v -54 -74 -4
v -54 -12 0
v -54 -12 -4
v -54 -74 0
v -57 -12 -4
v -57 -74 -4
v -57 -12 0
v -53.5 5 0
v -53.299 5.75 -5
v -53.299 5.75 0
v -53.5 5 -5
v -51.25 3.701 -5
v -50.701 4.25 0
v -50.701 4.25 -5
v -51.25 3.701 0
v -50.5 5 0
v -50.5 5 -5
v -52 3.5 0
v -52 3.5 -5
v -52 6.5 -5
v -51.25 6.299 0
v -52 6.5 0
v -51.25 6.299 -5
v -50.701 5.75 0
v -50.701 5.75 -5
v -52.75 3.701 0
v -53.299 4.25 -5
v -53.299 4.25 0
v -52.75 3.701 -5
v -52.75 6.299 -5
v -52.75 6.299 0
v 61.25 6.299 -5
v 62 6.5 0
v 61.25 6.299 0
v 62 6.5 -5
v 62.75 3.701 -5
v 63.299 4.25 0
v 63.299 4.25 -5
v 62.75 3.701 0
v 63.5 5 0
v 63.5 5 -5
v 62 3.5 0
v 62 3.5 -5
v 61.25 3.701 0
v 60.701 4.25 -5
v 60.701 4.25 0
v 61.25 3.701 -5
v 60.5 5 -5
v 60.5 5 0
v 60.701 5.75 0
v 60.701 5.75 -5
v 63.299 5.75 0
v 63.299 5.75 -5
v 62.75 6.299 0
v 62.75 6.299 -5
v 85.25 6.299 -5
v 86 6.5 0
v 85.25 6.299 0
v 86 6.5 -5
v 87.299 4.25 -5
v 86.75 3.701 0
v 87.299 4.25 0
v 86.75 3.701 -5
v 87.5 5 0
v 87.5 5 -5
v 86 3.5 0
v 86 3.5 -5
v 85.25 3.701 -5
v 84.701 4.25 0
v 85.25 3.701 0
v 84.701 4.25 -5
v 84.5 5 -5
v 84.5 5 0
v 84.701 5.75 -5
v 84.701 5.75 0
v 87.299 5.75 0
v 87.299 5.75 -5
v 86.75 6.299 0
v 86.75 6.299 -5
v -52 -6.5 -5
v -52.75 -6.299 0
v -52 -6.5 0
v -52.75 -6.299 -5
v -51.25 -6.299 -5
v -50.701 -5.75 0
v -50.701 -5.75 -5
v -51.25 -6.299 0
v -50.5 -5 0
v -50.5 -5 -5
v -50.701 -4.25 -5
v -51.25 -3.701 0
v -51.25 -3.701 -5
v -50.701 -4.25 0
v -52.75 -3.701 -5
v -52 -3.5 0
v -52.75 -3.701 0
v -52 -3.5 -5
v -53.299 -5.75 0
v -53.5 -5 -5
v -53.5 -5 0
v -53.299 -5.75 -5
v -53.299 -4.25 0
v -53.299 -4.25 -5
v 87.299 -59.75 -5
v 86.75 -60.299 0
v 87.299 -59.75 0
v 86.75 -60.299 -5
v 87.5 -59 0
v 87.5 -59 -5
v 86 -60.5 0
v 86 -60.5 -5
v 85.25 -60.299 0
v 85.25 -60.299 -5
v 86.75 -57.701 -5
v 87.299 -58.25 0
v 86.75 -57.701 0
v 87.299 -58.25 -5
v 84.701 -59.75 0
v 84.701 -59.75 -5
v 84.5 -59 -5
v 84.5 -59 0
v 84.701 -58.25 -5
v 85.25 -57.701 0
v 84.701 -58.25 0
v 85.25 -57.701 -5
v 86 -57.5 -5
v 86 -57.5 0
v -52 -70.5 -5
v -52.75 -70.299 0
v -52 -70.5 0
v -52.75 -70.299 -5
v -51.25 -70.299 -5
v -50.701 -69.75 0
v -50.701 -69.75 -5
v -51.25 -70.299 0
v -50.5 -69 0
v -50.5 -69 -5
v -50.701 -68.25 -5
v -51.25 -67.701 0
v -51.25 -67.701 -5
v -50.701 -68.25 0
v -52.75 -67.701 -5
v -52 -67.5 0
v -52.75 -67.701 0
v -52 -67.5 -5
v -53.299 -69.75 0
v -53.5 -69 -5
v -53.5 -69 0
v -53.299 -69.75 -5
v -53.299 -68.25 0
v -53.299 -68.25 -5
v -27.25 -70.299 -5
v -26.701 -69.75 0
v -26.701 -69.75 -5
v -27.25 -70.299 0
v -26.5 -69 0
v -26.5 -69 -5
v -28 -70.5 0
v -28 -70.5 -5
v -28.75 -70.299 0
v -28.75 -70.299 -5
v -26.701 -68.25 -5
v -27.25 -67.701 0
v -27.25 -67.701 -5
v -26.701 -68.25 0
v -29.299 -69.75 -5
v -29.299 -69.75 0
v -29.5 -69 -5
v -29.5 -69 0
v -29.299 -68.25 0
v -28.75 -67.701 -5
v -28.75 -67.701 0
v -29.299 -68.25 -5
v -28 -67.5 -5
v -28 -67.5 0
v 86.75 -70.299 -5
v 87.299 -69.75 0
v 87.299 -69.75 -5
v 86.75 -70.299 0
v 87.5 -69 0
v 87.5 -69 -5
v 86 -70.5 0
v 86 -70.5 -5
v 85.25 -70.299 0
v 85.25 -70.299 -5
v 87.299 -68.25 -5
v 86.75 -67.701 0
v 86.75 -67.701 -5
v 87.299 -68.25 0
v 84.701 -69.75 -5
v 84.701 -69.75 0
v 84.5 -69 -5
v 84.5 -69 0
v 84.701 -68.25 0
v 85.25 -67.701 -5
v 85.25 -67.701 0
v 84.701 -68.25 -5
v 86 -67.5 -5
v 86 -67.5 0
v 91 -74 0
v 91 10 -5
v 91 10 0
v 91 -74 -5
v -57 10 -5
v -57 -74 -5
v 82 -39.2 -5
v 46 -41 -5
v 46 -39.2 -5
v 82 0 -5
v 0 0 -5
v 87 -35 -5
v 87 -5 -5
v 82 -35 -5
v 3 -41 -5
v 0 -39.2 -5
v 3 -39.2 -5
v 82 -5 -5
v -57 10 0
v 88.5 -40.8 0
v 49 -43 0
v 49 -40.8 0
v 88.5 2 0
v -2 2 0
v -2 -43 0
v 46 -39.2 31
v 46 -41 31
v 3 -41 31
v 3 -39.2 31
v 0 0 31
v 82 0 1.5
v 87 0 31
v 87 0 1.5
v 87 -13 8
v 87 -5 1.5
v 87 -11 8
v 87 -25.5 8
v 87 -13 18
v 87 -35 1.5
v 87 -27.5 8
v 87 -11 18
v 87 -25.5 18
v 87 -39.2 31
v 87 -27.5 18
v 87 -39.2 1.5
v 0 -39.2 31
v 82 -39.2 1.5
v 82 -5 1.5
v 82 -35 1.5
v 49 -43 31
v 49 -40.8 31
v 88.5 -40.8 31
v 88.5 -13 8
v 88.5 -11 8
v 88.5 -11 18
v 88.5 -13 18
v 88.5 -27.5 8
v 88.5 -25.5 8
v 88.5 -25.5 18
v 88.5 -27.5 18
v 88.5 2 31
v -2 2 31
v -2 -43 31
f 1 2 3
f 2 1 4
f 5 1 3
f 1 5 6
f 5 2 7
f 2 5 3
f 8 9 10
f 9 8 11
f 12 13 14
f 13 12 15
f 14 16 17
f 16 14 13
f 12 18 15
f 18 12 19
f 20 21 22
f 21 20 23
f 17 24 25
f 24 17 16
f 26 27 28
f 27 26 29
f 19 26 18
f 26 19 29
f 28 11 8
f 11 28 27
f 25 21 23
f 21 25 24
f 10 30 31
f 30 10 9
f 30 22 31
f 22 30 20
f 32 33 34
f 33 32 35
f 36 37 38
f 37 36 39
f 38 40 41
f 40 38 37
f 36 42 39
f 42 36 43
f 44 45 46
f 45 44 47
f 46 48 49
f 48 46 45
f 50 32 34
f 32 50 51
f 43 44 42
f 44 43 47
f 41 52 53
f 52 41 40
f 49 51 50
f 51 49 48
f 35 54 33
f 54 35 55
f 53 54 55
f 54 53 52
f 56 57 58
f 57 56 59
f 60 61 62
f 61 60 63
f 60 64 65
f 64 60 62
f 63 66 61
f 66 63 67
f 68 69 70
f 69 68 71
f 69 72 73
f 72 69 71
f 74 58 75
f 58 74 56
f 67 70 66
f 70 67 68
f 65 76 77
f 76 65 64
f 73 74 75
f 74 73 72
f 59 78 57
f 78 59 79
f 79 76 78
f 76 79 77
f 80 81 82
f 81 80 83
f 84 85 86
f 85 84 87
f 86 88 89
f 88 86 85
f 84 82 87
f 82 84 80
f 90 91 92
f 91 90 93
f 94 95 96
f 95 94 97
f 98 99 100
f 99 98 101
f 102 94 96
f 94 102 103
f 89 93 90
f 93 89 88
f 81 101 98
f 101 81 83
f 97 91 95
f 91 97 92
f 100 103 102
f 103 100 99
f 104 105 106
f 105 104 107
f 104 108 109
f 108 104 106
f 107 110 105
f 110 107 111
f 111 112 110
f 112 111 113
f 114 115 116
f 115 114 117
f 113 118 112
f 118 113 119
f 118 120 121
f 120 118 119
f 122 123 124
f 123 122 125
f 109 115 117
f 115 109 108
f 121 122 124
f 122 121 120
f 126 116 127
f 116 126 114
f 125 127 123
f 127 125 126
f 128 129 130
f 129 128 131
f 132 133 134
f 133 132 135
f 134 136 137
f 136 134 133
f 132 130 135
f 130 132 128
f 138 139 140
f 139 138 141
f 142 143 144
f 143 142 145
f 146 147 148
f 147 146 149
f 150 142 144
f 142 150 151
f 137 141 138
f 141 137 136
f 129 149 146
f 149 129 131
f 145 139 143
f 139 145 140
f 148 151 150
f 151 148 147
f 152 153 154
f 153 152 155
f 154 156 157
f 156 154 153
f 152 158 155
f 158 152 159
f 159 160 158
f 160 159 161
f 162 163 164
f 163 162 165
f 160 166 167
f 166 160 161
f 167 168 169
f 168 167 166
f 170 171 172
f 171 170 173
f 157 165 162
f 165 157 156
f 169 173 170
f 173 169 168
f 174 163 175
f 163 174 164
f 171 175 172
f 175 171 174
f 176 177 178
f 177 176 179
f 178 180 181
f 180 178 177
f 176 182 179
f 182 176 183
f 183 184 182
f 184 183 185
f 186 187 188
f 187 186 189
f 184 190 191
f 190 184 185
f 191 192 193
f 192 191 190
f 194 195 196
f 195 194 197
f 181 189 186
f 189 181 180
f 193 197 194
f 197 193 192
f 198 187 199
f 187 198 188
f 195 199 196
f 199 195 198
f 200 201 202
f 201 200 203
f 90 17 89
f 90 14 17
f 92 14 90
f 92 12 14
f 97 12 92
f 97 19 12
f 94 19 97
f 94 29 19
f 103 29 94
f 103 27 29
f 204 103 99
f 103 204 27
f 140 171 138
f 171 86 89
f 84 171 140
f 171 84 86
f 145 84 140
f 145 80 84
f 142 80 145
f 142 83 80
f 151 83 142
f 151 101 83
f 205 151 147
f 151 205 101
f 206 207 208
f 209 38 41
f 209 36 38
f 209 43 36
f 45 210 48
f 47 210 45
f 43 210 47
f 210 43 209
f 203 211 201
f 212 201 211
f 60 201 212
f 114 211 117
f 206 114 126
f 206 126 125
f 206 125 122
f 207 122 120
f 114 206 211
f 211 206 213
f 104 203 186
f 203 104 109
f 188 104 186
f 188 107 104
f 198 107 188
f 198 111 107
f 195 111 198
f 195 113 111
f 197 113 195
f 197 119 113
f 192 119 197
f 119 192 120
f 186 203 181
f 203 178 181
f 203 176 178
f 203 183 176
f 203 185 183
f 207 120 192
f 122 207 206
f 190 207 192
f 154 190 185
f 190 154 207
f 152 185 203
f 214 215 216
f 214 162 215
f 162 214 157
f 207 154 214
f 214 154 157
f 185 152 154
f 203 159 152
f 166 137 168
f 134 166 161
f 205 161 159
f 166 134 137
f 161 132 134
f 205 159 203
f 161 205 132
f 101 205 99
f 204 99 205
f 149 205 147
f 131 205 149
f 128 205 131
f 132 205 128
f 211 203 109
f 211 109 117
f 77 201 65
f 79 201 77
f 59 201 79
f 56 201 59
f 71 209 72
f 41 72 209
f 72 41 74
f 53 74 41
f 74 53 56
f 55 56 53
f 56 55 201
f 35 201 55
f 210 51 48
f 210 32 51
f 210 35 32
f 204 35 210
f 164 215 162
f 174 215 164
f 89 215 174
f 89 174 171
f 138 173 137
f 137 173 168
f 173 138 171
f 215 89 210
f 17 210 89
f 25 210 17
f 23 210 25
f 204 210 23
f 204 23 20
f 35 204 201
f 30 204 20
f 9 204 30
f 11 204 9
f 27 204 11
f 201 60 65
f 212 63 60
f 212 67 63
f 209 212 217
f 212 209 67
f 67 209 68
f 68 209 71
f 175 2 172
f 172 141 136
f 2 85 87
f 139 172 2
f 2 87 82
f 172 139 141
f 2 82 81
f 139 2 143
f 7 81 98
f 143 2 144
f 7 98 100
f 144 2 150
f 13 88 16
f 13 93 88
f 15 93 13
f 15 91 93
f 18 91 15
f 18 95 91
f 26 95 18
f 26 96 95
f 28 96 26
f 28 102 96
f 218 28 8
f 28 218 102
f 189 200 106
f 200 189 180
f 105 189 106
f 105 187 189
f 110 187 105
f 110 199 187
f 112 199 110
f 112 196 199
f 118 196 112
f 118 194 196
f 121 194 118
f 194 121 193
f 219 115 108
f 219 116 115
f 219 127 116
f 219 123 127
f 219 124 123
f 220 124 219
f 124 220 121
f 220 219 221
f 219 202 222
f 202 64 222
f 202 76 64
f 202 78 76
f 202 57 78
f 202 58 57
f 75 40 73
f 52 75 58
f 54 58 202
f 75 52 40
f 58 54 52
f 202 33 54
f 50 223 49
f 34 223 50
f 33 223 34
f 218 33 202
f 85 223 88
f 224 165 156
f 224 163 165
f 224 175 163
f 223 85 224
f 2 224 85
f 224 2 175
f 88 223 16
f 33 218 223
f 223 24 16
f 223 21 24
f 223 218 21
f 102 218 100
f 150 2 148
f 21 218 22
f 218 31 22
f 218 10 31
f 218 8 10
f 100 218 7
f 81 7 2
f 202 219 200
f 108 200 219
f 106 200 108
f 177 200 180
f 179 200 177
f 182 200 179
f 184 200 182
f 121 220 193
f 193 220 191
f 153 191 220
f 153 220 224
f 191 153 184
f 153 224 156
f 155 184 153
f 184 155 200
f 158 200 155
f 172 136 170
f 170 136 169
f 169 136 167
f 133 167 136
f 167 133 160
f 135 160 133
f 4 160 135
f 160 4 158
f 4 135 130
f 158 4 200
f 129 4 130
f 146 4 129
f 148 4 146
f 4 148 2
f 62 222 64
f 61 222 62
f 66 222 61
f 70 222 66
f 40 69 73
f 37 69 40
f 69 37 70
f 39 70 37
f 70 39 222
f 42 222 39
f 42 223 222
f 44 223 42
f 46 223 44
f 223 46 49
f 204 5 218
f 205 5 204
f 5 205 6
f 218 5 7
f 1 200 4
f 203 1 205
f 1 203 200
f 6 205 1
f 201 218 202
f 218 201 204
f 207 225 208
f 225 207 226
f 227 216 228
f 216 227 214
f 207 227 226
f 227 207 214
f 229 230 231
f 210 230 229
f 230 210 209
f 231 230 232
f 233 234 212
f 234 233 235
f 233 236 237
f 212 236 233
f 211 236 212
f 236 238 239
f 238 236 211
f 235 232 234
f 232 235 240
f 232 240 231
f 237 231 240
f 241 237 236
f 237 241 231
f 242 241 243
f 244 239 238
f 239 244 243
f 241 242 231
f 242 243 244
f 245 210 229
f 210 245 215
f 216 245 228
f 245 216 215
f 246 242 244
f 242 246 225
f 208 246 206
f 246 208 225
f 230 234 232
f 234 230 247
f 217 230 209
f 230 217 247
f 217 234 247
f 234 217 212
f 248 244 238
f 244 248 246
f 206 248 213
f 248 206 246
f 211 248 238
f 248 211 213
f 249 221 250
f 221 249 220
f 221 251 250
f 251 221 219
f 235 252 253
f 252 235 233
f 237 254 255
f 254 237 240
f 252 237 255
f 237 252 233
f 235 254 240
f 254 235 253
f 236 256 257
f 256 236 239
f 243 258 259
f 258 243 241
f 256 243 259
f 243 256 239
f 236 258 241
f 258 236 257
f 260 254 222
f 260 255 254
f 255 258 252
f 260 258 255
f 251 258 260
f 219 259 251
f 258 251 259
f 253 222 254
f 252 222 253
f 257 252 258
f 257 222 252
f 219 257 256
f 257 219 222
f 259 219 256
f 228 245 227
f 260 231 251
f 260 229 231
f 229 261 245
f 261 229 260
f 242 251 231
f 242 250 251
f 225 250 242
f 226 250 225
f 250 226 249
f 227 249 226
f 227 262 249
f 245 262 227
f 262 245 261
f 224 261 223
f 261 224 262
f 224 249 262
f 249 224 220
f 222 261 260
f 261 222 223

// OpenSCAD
// move & rotate
translate_x=-52;
translate_y=-5;
rotate_z=0;
// space for motherboard
space_for_motherboard=true;

rotate(a=[180,0,0])
union()
{
    difference()
    {
        rotate(a=[0,0,rotate_z])
        translate([translate_x,translate_y,0])
        // plate with screw holes
        difference()
        {
            translate([-5,-5,0])
                cube([148,84,5],center=false);
            union()
            {
                if (space_for_motherboard)
                {
                    translate([-6,17,-3])
                        cube([4,63,7],center=false);
                }
                // atx psu screw holes
                cylinder(h=12, r=1.5, $fn=12, center=true);
                translate([114,0,0])
                    cylinder(h=12, r=1.5, $fn=12, center=true);
                translate([138,0,0])
                    cylinder(h=12, r=1.5, $fn=12, center=true);
                translate([0,10,0])
                    cylinder(h=12, r=1.5, $fn=12, center=true);
                translate([138,64,0])
                    cylinder(h=12, r=1.5, $fn=12, center=true);
                translate([0,74,0])
                    cylinder(h=12, r=1.5, $fn=12, center=true);
                translate([24,74,0])
                    cylinder(h=12, r=1.5, $fn=12, center=true);
                translate([138,74,0])
                    cylinder(h=12, r=1.5, $fn=12, center=true);
            }
        }
        
        translate([0,0,-1])
        difference()
        {
            union()
            {
                translate([3,0,0])
                    cube([43,41,7],center=false);
                cube([87,39.2,7],center=false);
            }
            /*
            union()
            {
                translate([82,0,0])
                    cube([5,5,7],center=false);
                translate([82,35,0])
                    cube([5,5,7],center=false);
            }
            */
        }
    }
    
    union()
    {
        translate([82,0,-1.5])
            cube([5,5,6.5],center=false);
        translate([82,35,-1.5])
            cube([5,5,6.5],center=false);
    }
            
    translate([-2,-2,-31])
        difference()
        {
            cube([90.5,45,36],center=false);
            union()
            {
                translate([5,2,-1])
                    cube([43,41,38],center=false);
                translate([2,2,-1])
                    cube([87,39.2,38],center=false);
                translate([51,42.8,-1])
                    cube([41,4,38],center=false);
                // slots
                translate([88.5,13,13])
                    cube([6,2,10],center=false);
                translate([87.5,27.5,13])
                    cube([6,2,10],center=false);
            }
        }
}
